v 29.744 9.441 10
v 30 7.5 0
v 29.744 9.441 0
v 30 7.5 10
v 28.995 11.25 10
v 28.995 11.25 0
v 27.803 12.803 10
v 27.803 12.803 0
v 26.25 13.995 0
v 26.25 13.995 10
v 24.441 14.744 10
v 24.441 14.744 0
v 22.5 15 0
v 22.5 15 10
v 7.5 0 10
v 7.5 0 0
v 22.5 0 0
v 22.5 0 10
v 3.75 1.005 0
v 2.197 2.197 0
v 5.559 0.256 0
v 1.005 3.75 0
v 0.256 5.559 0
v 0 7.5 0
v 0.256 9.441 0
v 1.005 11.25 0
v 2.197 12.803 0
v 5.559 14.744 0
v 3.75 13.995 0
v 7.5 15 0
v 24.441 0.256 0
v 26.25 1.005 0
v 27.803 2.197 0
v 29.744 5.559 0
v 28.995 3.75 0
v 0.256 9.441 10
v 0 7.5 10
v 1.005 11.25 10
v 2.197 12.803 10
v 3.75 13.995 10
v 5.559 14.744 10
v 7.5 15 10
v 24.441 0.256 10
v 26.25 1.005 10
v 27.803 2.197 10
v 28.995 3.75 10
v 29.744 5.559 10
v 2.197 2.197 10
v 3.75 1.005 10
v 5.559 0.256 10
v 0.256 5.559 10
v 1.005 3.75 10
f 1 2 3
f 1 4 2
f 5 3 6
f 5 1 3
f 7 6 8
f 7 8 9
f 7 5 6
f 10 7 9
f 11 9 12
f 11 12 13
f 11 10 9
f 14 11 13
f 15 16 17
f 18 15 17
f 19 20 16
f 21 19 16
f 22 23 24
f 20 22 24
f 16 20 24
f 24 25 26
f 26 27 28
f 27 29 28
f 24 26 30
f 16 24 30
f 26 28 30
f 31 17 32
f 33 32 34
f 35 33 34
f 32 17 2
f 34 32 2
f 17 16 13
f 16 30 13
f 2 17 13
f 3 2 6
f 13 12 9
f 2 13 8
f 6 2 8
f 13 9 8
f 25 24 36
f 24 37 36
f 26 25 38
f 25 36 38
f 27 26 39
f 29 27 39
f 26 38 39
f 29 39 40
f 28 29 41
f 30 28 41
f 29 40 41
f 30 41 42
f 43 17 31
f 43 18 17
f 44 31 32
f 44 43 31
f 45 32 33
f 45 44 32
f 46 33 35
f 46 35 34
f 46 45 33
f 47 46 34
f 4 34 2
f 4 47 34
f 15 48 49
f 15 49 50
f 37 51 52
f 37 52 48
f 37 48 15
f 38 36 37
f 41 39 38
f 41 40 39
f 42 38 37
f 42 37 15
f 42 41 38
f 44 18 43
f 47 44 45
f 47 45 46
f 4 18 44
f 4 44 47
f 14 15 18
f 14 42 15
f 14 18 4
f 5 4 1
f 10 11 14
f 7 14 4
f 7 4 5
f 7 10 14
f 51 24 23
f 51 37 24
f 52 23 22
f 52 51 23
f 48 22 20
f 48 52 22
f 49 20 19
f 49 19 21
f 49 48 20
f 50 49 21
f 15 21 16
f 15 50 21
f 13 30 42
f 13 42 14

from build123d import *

# Parameters (mm, degrees)
SKETCH1_W           = 30
SKETCH1_H           = 15
BOSS_EXTRUDE1_DEPTH = 10
FILLET1_R           = 7.5


with BuildPart() as part:
    # Sketch1 → Boss-Extrude1 (new body)
    with BuildSketch(Plane.XY):
        with Locations((15, 7.5)):
            Rectangle(SKETCH1_W, SKETCH1_H)
    extrude(amount=BOSS_EXTRUDE1_DEPTH)

    # Fillet1
    fillet1_edges = [part.edges().sort_by_distance(p)[0] for p in [
        (30, 0, 5),
        (30, 15, 5),
        (0, 0, 5),
        (0, 15, 5),
    ]]
    fillet(fillet1_edges, radius=FILLET1_R - 0.0001)  # a hair under: the kernel refuses the full size


solid = part.part
